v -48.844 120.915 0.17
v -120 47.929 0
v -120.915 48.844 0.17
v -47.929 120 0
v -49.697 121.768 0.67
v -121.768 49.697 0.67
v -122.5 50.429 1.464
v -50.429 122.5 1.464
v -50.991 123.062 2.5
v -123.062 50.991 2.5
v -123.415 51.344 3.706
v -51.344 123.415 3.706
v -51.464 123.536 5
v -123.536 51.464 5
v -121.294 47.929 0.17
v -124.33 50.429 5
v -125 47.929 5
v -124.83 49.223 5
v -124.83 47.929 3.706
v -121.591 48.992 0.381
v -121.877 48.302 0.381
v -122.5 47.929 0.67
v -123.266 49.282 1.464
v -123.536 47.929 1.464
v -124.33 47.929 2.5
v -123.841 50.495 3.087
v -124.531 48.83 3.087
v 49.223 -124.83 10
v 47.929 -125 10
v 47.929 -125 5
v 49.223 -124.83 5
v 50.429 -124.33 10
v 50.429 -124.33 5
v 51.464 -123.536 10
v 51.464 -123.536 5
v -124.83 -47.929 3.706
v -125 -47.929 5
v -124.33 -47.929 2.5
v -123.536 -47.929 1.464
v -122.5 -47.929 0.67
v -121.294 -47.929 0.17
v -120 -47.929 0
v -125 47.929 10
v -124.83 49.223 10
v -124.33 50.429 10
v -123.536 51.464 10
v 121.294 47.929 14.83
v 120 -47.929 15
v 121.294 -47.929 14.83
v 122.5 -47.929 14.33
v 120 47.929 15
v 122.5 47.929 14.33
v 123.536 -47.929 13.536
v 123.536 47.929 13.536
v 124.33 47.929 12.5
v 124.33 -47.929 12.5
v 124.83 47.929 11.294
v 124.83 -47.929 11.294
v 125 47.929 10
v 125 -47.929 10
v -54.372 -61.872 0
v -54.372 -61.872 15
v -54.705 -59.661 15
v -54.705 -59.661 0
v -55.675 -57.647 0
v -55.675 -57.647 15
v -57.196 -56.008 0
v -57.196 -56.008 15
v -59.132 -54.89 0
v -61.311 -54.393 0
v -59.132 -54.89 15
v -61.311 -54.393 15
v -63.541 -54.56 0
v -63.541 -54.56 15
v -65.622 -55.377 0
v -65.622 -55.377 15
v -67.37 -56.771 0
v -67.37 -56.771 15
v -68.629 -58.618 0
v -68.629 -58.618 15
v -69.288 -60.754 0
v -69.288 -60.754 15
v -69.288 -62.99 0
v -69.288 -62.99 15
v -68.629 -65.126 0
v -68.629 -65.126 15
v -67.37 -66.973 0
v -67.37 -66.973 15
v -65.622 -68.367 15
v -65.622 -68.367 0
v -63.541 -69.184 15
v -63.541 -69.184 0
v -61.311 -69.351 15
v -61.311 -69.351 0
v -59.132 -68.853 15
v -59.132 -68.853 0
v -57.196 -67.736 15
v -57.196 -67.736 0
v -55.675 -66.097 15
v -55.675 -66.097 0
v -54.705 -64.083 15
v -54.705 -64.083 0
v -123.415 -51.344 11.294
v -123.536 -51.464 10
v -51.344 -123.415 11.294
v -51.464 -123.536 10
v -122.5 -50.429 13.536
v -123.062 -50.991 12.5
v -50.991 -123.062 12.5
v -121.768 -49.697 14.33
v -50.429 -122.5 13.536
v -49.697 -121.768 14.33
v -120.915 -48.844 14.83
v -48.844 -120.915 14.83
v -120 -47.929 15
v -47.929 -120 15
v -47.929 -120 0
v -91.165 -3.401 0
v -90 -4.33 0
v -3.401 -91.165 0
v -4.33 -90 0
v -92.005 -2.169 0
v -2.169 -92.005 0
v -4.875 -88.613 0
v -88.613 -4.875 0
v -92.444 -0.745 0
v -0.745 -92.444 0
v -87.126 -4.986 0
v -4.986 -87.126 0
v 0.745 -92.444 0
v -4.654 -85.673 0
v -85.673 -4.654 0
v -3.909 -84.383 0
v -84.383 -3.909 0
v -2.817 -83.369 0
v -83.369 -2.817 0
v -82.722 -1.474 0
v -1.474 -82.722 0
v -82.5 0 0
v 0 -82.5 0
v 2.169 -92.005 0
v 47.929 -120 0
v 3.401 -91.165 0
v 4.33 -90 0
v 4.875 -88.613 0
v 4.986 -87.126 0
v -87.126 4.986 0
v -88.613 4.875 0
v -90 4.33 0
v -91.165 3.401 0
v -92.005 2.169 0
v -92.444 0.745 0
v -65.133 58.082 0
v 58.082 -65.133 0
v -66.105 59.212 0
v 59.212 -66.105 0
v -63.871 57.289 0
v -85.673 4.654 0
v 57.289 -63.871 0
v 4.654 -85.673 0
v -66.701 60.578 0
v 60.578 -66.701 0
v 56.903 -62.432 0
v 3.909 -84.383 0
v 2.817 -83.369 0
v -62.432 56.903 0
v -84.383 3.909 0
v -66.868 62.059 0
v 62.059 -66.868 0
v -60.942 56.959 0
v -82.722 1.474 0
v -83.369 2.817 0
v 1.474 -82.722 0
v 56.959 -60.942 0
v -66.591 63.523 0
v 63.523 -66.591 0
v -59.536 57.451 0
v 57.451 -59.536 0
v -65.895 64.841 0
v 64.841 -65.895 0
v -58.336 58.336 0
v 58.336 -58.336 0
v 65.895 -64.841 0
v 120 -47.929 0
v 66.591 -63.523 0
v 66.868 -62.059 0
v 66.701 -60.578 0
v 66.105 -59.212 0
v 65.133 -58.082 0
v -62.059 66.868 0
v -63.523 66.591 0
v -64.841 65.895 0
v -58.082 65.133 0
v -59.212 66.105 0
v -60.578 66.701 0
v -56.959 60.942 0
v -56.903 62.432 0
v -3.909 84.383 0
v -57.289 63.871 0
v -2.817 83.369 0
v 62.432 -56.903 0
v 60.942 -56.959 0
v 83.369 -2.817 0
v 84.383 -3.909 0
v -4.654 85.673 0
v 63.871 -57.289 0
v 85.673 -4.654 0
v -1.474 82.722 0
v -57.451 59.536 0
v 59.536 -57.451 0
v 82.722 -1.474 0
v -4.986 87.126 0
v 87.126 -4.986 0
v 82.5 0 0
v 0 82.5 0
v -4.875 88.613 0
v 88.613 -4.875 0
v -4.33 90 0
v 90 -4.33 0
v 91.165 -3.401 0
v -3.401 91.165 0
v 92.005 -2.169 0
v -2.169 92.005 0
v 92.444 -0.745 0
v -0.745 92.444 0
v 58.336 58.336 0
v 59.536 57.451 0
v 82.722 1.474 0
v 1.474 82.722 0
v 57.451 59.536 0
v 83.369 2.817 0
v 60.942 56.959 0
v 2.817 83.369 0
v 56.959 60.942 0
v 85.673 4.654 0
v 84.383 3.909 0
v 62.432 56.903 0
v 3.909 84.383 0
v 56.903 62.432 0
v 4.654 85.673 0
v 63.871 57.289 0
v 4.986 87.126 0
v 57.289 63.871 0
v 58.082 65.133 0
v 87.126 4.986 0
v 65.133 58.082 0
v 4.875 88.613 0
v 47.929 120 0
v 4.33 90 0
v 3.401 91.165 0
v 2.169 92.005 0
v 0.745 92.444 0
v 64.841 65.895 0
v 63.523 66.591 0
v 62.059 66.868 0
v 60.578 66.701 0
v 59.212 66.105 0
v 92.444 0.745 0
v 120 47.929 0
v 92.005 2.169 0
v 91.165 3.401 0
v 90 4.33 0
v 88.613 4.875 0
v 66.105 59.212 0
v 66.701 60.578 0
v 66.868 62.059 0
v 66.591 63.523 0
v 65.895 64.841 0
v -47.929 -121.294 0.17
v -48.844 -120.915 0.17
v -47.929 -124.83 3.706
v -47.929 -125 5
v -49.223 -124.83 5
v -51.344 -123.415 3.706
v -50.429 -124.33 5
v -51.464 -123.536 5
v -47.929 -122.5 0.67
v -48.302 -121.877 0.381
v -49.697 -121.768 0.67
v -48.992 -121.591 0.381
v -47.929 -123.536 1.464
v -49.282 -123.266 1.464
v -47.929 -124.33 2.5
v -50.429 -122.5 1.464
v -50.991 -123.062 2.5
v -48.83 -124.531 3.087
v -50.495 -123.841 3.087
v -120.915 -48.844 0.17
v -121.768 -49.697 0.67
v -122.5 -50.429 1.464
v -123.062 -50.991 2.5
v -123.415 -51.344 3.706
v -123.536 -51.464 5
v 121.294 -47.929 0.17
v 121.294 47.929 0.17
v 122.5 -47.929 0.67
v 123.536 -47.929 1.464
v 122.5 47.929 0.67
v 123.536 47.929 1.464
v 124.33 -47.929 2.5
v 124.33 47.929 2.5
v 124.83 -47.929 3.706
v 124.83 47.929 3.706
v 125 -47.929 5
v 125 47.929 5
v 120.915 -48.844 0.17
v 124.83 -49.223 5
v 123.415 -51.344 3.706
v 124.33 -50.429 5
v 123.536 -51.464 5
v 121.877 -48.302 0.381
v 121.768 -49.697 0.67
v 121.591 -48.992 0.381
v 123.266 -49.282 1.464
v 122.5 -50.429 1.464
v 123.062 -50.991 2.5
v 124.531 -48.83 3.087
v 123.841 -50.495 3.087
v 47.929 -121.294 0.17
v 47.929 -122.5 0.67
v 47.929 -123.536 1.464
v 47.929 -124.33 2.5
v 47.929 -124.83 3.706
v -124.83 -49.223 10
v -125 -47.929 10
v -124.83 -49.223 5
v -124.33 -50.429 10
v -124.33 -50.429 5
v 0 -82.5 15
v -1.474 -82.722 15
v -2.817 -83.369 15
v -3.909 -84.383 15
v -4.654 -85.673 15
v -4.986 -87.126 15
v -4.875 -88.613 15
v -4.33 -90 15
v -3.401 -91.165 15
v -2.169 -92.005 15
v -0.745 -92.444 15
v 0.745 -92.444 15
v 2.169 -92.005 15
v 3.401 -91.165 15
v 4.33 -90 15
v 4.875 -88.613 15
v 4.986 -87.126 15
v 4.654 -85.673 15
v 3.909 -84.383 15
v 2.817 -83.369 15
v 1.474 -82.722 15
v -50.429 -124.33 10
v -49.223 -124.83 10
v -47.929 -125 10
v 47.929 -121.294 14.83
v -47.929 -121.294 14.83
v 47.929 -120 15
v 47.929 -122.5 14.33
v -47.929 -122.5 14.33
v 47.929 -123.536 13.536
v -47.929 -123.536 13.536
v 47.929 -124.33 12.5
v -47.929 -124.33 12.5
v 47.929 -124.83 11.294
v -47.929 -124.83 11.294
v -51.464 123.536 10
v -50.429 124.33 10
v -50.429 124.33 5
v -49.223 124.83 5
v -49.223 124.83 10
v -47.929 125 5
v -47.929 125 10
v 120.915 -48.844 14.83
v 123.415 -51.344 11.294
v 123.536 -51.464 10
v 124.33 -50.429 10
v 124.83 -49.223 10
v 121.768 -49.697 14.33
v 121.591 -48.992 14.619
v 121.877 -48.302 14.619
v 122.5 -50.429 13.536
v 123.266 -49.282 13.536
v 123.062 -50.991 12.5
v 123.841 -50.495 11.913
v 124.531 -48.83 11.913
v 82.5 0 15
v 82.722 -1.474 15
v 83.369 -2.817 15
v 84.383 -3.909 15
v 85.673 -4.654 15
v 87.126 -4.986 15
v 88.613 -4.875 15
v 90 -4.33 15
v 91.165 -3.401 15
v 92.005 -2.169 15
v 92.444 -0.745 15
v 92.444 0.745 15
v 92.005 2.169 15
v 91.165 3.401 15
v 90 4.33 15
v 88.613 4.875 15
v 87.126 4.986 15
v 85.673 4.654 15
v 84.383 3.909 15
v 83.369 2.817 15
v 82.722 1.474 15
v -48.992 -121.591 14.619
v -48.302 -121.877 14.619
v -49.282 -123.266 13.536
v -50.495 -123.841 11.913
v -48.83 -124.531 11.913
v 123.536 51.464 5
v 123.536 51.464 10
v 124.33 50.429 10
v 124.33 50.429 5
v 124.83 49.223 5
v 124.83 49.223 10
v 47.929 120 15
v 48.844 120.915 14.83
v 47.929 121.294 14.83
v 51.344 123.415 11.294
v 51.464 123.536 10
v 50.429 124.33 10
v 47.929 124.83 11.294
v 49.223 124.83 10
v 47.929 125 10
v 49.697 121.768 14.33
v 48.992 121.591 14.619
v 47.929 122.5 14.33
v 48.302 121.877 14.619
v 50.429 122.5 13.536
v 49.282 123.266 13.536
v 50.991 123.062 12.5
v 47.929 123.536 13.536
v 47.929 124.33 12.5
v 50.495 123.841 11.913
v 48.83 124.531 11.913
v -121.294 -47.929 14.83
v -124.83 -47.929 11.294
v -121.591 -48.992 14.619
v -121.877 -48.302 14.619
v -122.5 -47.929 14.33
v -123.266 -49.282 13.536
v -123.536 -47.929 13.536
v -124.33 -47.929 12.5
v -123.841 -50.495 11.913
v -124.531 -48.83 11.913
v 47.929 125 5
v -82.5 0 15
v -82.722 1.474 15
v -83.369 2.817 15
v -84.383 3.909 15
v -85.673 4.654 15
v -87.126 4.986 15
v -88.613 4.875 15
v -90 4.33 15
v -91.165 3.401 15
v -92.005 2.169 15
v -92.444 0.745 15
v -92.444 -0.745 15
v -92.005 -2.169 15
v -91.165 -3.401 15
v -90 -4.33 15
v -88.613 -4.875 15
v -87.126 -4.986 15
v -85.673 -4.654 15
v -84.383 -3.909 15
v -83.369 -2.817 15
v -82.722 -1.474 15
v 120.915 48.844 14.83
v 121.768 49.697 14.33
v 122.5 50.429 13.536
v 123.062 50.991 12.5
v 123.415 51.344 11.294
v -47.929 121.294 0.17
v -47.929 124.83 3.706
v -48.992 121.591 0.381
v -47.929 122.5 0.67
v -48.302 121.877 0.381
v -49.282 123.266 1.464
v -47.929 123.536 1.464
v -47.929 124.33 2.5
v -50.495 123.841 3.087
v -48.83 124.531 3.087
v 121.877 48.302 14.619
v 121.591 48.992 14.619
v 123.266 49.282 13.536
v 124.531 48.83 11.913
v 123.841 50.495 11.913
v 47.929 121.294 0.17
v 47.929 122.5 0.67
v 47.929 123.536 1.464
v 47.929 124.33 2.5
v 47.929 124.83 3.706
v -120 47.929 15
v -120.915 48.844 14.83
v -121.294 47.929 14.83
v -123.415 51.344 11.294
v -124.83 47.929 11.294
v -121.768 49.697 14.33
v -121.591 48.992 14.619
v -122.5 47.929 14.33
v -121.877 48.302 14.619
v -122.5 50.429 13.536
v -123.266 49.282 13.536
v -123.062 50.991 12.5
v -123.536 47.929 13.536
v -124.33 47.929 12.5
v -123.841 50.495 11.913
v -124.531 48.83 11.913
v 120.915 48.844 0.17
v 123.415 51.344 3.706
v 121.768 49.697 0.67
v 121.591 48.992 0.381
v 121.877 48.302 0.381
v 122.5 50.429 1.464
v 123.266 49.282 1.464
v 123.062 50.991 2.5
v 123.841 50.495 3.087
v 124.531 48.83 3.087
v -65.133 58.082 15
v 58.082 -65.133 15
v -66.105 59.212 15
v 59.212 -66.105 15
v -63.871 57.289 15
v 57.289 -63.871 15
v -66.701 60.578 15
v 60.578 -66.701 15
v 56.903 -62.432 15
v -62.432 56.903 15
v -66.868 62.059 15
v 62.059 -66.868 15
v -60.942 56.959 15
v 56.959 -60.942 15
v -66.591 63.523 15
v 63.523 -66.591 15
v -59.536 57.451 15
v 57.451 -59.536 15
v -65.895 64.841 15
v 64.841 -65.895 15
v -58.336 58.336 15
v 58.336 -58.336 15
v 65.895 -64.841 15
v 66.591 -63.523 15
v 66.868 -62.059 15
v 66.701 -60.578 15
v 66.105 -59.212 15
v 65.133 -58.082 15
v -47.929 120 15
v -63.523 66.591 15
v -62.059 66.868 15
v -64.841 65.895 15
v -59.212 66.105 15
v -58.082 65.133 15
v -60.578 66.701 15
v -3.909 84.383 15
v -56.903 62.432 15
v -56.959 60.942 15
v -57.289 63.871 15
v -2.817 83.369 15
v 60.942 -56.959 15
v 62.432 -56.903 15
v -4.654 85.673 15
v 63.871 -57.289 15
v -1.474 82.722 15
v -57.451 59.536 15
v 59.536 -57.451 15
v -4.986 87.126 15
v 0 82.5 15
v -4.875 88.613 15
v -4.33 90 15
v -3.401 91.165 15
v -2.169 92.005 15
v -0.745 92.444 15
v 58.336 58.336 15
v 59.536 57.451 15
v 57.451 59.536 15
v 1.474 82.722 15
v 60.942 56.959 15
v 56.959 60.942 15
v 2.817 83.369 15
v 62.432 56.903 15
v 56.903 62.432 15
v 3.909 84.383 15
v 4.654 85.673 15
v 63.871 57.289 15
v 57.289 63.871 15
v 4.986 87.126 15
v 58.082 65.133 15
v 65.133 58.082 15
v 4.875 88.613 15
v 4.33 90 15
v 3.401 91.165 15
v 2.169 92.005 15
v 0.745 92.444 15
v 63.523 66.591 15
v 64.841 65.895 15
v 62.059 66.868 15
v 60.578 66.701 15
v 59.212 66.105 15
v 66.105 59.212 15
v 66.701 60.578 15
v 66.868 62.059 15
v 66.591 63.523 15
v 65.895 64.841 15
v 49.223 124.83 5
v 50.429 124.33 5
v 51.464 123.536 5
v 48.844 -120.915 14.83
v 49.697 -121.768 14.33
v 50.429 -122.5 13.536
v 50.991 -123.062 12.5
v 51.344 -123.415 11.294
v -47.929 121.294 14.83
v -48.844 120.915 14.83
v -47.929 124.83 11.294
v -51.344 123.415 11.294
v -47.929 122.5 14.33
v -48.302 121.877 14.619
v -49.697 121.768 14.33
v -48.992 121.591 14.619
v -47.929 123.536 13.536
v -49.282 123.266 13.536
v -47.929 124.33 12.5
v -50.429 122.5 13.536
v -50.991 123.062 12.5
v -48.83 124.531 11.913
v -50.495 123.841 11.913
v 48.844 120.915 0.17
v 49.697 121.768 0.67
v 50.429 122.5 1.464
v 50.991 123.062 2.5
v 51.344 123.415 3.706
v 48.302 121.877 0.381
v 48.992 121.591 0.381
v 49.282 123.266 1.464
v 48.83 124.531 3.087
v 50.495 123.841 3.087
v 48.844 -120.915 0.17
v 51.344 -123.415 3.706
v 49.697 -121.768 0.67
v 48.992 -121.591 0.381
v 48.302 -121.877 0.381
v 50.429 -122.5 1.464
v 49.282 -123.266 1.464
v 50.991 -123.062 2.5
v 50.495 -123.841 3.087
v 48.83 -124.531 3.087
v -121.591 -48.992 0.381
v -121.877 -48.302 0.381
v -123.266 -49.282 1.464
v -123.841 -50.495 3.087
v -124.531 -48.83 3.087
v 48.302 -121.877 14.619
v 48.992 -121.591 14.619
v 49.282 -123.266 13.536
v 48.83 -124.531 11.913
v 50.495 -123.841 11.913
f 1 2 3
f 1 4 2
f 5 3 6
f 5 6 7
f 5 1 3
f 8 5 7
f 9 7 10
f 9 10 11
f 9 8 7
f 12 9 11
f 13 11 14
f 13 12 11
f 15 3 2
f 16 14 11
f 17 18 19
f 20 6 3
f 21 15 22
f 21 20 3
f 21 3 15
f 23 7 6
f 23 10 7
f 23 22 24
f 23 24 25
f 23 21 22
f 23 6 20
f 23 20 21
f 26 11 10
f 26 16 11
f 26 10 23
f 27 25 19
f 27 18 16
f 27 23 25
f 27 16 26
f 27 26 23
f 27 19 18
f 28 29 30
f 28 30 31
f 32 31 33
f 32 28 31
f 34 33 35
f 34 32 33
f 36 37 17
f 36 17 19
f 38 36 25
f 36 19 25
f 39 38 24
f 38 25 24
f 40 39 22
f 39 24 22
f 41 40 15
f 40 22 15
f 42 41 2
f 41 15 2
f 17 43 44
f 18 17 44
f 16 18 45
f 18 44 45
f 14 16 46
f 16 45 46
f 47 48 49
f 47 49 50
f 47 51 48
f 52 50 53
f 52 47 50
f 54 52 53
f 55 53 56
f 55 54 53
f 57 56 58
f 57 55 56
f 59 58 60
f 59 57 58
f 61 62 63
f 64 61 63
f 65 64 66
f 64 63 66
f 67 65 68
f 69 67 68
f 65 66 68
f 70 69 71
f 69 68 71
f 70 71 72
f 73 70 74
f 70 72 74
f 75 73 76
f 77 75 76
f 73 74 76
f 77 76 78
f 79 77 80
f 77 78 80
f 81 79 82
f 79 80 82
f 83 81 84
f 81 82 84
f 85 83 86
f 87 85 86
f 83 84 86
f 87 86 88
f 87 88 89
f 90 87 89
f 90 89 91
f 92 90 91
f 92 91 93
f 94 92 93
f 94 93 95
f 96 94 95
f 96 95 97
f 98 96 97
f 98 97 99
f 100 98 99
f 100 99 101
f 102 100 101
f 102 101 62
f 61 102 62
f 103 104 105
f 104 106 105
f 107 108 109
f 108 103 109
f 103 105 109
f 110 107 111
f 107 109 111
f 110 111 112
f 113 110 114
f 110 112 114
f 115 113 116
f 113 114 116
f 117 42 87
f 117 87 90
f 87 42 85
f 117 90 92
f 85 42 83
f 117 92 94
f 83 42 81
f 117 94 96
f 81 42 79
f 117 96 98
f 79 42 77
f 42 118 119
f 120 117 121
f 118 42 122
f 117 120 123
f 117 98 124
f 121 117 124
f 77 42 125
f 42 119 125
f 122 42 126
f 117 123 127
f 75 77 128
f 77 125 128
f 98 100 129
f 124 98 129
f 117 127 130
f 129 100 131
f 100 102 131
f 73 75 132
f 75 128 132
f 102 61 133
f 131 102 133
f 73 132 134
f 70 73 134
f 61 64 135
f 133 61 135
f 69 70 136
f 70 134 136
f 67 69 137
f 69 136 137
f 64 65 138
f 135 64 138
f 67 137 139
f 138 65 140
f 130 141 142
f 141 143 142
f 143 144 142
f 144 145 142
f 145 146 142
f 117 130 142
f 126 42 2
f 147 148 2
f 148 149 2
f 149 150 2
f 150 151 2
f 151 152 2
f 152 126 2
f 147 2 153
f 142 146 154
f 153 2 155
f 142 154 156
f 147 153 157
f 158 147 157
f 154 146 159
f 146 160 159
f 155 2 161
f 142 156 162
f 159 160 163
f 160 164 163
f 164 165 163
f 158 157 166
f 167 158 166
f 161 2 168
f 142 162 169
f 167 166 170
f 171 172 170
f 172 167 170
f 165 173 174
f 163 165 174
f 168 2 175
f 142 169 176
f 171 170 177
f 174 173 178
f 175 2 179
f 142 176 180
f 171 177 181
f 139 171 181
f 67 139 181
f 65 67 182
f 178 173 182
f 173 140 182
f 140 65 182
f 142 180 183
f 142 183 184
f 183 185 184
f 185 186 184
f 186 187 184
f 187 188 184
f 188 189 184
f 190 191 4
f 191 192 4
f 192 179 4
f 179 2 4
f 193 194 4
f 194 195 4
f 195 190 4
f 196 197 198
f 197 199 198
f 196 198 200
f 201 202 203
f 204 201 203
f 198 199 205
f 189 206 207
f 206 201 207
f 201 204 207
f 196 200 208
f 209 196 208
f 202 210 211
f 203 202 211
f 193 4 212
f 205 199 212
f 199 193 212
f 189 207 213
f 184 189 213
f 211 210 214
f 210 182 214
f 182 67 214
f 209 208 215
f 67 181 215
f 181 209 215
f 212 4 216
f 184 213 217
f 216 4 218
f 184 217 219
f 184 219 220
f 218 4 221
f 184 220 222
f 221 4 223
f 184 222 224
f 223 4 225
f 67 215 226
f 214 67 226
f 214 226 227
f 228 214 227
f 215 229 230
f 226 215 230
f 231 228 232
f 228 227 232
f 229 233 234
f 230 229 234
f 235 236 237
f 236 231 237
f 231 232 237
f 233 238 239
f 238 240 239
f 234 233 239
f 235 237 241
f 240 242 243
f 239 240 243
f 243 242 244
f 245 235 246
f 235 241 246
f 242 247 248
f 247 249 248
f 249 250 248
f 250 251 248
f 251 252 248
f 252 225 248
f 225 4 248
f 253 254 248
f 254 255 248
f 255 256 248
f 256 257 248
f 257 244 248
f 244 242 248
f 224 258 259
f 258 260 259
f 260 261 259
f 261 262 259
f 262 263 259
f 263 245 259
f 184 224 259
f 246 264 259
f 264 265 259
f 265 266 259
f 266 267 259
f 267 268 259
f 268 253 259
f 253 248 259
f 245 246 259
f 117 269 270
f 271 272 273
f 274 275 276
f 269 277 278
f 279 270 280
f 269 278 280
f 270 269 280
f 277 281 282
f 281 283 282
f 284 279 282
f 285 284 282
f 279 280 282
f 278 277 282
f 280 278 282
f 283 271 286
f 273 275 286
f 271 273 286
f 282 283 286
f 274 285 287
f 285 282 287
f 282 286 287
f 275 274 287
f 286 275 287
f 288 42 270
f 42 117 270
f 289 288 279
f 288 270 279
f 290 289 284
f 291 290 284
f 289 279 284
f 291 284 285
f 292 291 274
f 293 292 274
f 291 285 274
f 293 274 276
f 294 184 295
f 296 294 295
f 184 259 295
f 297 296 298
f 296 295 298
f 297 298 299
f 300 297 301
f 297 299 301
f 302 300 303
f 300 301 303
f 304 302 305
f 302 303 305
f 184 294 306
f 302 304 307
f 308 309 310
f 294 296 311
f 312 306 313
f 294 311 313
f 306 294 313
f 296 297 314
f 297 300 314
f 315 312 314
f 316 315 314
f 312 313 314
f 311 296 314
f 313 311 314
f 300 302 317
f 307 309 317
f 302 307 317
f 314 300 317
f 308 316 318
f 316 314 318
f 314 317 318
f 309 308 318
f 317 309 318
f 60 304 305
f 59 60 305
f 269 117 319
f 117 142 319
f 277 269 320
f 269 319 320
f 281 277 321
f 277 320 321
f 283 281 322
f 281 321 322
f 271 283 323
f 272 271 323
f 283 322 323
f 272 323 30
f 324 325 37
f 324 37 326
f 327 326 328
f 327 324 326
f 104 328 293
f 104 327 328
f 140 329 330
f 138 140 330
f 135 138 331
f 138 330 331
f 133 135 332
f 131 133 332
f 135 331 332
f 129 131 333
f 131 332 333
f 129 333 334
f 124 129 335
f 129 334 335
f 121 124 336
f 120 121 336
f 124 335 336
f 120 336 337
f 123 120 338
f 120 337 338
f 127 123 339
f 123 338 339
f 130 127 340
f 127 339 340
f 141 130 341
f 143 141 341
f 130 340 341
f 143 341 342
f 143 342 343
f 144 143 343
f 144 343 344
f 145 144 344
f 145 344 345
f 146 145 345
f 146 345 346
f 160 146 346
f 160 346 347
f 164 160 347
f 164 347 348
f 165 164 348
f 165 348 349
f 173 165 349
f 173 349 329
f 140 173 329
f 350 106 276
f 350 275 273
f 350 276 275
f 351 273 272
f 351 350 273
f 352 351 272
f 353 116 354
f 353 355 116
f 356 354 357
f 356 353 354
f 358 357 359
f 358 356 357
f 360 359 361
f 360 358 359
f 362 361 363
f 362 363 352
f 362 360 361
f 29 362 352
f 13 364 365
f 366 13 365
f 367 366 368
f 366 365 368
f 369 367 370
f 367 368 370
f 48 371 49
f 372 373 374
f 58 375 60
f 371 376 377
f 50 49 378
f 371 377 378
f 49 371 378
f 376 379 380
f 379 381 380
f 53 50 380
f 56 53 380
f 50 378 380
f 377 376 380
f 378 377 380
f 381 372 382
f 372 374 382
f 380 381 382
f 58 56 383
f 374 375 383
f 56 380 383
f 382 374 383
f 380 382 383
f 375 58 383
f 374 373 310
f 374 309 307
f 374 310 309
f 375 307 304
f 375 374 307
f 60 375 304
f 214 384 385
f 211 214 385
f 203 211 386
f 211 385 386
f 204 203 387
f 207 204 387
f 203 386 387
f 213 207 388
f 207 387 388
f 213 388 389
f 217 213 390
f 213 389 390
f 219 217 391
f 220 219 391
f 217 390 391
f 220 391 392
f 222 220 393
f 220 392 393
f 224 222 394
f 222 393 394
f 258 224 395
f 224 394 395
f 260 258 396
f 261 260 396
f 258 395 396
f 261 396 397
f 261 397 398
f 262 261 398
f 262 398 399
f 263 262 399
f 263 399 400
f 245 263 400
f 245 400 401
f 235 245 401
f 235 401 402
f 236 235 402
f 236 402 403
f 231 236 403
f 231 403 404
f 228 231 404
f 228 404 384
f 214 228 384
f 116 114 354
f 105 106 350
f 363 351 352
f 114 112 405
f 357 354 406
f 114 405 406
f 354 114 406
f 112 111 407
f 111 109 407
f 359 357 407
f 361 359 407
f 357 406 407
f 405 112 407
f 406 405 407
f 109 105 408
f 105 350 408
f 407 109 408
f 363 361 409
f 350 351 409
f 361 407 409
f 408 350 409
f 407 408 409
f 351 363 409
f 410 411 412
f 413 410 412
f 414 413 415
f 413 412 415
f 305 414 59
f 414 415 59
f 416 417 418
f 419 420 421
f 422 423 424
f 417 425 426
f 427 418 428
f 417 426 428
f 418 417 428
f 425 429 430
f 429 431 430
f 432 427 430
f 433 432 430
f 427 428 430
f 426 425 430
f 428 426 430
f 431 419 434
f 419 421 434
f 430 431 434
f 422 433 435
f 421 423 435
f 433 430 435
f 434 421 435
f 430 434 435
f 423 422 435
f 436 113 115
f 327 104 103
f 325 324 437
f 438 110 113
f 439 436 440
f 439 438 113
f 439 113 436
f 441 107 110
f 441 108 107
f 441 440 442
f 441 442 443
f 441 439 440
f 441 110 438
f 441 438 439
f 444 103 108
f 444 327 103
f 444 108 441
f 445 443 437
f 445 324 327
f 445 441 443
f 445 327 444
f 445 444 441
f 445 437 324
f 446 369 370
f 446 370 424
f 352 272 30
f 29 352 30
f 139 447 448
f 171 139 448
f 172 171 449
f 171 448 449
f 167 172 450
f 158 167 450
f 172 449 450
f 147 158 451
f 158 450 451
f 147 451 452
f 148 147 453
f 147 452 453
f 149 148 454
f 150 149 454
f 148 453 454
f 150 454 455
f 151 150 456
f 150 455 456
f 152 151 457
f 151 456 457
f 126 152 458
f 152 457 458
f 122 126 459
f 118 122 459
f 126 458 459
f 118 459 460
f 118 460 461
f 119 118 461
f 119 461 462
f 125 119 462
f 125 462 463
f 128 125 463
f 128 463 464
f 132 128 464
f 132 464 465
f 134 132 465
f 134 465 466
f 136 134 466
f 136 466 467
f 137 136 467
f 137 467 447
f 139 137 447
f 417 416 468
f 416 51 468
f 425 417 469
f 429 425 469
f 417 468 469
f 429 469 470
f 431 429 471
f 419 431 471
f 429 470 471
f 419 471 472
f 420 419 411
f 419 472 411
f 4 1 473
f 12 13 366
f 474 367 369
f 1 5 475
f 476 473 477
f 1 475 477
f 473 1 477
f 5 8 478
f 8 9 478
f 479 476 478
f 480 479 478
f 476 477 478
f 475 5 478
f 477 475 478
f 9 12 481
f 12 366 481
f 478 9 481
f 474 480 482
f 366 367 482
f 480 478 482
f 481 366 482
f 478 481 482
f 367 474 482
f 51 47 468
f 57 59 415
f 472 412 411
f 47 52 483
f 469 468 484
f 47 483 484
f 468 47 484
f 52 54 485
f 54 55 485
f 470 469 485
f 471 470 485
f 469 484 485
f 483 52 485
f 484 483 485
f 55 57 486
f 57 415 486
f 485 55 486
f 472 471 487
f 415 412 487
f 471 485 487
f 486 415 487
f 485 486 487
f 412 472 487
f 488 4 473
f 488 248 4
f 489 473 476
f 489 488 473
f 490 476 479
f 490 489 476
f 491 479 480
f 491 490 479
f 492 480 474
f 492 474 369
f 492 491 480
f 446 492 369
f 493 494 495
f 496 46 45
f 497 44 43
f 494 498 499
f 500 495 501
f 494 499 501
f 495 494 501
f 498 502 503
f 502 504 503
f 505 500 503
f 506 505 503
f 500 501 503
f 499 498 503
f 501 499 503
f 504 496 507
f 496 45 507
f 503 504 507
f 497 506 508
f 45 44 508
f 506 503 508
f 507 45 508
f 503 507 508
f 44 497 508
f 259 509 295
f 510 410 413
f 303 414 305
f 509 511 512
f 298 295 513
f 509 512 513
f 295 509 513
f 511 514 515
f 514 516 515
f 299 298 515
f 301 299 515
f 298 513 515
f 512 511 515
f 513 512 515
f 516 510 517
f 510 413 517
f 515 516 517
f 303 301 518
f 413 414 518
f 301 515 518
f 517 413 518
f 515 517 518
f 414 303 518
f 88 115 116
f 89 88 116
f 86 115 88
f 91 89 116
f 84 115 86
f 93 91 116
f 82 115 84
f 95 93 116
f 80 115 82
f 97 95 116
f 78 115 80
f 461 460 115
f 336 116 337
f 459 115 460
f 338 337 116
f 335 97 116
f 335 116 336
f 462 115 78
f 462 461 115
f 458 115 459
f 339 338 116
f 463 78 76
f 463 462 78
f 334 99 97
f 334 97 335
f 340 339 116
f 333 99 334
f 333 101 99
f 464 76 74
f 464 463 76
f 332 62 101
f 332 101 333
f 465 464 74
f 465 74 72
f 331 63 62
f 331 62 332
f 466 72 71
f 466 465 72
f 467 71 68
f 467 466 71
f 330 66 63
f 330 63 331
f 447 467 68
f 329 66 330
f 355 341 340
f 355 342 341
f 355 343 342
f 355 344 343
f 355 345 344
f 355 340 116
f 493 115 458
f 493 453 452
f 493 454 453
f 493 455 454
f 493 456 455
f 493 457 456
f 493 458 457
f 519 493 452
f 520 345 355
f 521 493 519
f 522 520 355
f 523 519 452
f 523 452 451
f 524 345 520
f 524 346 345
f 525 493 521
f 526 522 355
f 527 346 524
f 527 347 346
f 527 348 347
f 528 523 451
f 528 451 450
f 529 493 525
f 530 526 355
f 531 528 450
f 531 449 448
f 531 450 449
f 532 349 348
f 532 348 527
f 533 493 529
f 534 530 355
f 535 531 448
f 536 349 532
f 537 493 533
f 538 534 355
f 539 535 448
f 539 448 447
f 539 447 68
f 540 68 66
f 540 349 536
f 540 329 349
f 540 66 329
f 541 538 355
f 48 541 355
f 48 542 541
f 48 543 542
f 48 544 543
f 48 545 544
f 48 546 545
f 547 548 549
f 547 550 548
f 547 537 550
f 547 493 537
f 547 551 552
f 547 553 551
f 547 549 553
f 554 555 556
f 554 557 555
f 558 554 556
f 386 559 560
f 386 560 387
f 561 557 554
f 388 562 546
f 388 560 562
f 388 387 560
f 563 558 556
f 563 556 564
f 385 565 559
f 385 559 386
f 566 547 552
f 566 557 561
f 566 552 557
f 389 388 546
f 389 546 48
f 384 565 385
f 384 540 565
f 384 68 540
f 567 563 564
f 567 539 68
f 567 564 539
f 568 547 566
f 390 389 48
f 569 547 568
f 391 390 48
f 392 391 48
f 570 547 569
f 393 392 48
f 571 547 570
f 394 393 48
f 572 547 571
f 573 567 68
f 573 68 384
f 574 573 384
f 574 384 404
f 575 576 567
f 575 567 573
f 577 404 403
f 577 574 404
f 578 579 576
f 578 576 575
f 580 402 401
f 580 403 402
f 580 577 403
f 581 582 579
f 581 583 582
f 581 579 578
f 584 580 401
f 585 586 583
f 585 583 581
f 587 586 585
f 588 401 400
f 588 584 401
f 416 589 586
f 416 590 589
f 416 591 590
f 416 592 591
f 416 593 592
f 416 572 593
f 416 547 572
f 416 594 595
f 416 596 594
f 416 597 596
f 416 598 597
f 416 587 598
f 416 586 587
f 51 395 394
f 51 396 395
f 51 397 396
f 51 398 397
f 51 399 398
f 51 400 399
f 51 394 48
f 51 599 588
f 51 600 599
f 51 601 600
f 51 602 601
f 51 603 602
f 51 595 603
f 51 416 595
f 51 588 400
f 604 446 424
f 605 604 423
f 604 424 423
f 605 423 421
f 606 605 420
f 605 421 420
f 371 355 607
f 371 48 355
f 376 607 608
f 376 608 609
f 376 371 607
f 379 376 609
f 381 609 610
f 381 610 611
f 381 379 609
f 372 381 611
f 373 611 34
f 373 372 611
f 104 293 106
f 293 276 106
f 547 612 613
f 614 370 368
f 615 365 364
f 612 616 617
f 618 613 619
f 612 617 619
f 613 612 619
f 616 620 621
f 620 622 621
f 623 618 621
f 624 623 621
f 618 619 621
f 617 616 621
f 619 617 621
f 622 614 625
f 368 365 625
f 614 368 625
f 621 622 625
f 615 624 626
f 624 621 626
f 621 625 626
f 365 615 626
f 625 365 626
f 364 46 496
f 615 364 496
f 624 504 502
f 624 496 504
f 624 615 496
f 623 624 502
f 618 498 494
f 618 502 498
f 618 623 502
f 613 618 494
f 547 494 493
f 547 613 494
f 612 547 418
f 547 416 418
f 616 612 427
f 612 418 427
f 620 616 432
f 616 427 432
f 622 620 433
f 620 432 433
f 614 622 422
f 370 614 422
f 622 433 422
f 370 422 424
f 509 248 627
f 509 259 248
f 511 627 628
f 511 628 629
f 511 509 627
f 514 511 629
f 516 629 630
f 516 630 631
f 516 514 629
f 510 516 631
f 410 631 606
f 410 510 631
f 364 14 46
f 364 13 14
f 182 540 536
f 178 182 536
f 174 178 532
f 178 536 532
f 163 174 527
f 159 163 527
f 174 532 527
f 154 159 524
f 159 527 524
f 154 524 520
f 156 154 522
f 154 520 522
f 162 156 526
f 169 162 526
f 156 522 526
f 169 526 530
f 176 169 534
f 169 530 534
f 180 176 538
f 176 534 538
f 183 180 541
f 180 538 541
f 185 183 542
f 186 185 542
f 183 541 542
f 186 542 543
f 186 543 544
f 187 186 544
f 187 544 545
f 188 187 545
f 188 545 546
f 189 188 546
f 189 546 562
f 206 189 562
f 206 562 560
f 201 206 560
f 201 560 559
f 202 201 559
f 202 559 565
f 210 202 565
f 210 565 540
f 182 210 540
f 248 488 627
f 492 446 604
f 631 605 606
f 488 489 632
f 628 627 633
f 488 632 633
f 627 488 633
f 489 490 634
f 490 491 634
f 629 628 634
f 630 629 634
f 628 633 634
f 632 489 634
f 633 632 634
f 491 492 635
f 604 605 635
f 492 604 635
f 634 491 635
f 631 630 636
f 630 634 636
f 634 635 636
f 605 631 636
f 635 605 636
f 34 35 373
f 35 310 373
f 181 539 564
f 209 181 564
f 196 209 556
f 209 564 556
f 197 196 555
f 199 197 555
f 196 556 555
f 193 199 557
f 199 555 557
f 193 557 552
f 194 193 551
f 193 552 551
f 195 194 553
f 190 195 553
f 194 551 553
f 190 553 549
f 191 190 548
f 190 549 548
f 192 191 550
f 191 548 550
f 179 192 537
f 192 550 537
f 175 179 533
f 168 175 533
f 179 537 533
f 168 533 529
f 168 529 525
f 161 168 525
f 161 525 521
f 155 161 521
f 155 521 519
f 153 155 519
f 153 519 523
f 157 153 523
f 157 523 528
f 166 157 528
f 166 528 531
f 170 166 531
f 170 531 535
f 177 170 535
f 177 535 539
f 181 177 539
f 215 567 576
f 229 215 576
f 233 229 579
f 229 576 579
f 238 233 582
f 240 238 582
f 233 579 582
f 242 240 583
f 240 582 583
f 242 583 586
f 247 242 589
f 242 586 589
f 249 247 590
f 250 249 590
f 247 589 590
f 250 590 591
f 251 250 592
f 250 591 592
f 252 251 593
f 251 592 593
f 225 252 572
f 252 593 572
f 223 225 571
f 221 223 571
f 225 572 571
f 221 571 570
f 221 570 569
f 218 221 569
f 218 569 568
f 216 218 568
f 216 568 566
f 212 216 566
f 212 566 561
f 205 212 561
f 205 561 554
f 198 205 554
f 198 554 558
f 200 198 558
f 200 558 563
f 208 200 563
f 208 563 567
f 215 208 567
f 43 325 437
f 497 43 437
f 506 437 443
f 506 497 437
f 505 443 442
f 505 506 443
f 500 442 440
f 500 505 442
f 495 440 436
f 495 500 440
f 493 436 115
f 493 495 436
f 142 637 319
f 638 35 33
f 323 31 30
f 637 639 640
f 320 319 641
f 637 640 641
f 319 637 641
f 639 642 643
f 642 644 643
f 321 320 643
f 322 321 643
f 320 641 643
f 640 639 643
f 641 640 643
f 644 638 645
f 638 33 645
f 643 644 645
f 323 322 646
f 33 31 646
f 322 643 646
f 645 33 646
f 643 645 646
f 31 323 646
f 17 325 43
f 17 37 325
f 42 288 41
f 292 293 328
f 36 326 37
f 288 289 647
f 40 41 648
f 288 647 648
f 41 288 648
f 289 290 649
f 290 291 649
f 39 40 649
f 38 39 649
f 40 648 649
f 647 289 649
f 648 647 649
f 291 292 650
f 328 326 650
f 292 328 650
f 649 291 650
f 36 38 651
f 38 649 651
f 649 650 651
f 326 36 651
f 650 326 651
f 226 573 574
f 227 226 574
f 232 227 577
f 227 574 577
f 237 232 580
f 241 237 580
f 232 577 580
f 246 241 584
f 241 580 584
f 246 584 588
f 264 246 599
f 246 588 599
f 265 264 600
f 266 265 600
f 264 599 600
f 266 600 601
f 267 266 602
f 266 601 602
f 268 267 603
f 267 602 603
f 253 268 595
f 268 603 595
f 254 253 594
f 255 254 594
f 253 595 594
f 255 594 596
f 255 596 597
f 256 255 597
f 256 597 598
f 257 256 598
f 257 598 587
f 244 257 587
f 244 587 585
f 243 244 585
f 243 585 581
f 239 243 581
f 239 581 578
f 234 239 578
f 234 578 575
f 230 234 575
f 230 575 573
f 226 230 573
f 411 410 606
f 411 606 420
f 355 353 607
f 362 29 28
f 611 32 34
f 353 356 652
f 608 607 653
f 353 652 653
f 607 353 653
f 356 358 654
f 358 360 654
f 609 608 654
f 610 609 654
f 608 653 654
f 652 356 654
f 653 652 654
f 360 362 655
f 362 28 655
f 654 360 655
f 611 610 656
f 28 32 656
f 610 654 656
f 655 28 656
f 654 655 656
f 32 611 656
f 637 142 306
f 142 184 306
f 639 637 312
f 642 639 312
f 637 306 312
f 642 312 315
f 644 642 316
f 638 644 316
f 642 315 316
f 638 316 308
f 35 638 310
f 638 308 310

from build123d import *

# Parameters (mm, degrees)
F0_W            = 250
F0_H            = 250
F1_DEPTH        = 15
F3_R            = 5
F4_DEPTH        = 15.001
F4_COPIES_COUNT = 7
F4_COPIES_ANGLE = 270
F6_R            = 7.5
F7_DEPTH        = 15.001
F8_SIZE         = 75
F9_R            = 5


# Not quite as in the source:
# - a pattern or mirror of a feature is missing from the dataset's text; its kind, count and spacing are read off the source's solid


with BuildPart() as f1:
    # F0 (on Top) → F1 (new body)
    with BuildSketch(Plane.XY):
        Rectangle(F0_W, F0_H)
    extrude(amount=F1_DEPTH)

    # F3 (on face) → F4 (cut, through all)
    with BuildSketch(Plane.XY.offset(15)):
        with Locations((-87.5, 0)):
            Circle(F3_R)
    f4 = extrude(amount=-F4_DEPTH, mode=Mode.SUBTRACT)

    # F4_copies: F4 ×7 about axis
    f4_copies_axis = Axis((0, 0, 0), (0, 0, -1))
    for i in range(1, F4_COPIES_COUNT):
        add(f4.rotate(f4_copies_axis, i * F4_COPIES_ANGLE / (F4_COPIES_COUNT - 1)), mode=Mode.SUBTRACT)

    # F6 (on face) → F7 (cut, through all)
    with BuildSketch(Plane.XY.offset(15)):
        with Locations((-61.8718433538, -61.8718433538)):
            Circle(F6_R)
    extrude(amount=-F7_DEPTH, mode=Mode.SUBTRACT)

    # F8
    f8_edges = [f1.edges().sort_by_distance(p)[0] for p in [
        (-125, 125, 7.5),
        (-125, -125, 7.5),
        (125, -125, 7.5),
        (125, 125, 7.5),
    ]]
    chamfer(f8_edges, length=F8_SIZE)

    # F9
    f9_edges = [f1.edges().sort_by_distance(p)[0] for p in [
        (-125, 0, 15),
        (-125, 0, 0),
        (-125, 50, 7.5),
        (-125, -50, 7.5),
        (-87.5, -87.5, 0),
        (-50, -125, 7.5),
        (-87.5, -87.5, 15),
        (0, -125, 0),
        (50, -125, 7.5),
        (0, -125, 15),
        (87.5, -87.5, 0),
        (125, -50, 7.5),
        (87.5, -87.5, 15),
        (125, 0, 0),
        (125, 50, 7.5),
        (125, 0, 15),
        (87.5, 87.5, 0),
        (50, 125, 7.5),
        (87.5, 87.5, 15),
        (0, 125, 0),
        (-50, 125, 7.5),
        (0, 125, 15),
        (-87.5, 87.5, 0),
        (-87.5, 87.5, 15),
    ]]
    fillet(f9_edges, radius=F9_R)


solid = f1.part
